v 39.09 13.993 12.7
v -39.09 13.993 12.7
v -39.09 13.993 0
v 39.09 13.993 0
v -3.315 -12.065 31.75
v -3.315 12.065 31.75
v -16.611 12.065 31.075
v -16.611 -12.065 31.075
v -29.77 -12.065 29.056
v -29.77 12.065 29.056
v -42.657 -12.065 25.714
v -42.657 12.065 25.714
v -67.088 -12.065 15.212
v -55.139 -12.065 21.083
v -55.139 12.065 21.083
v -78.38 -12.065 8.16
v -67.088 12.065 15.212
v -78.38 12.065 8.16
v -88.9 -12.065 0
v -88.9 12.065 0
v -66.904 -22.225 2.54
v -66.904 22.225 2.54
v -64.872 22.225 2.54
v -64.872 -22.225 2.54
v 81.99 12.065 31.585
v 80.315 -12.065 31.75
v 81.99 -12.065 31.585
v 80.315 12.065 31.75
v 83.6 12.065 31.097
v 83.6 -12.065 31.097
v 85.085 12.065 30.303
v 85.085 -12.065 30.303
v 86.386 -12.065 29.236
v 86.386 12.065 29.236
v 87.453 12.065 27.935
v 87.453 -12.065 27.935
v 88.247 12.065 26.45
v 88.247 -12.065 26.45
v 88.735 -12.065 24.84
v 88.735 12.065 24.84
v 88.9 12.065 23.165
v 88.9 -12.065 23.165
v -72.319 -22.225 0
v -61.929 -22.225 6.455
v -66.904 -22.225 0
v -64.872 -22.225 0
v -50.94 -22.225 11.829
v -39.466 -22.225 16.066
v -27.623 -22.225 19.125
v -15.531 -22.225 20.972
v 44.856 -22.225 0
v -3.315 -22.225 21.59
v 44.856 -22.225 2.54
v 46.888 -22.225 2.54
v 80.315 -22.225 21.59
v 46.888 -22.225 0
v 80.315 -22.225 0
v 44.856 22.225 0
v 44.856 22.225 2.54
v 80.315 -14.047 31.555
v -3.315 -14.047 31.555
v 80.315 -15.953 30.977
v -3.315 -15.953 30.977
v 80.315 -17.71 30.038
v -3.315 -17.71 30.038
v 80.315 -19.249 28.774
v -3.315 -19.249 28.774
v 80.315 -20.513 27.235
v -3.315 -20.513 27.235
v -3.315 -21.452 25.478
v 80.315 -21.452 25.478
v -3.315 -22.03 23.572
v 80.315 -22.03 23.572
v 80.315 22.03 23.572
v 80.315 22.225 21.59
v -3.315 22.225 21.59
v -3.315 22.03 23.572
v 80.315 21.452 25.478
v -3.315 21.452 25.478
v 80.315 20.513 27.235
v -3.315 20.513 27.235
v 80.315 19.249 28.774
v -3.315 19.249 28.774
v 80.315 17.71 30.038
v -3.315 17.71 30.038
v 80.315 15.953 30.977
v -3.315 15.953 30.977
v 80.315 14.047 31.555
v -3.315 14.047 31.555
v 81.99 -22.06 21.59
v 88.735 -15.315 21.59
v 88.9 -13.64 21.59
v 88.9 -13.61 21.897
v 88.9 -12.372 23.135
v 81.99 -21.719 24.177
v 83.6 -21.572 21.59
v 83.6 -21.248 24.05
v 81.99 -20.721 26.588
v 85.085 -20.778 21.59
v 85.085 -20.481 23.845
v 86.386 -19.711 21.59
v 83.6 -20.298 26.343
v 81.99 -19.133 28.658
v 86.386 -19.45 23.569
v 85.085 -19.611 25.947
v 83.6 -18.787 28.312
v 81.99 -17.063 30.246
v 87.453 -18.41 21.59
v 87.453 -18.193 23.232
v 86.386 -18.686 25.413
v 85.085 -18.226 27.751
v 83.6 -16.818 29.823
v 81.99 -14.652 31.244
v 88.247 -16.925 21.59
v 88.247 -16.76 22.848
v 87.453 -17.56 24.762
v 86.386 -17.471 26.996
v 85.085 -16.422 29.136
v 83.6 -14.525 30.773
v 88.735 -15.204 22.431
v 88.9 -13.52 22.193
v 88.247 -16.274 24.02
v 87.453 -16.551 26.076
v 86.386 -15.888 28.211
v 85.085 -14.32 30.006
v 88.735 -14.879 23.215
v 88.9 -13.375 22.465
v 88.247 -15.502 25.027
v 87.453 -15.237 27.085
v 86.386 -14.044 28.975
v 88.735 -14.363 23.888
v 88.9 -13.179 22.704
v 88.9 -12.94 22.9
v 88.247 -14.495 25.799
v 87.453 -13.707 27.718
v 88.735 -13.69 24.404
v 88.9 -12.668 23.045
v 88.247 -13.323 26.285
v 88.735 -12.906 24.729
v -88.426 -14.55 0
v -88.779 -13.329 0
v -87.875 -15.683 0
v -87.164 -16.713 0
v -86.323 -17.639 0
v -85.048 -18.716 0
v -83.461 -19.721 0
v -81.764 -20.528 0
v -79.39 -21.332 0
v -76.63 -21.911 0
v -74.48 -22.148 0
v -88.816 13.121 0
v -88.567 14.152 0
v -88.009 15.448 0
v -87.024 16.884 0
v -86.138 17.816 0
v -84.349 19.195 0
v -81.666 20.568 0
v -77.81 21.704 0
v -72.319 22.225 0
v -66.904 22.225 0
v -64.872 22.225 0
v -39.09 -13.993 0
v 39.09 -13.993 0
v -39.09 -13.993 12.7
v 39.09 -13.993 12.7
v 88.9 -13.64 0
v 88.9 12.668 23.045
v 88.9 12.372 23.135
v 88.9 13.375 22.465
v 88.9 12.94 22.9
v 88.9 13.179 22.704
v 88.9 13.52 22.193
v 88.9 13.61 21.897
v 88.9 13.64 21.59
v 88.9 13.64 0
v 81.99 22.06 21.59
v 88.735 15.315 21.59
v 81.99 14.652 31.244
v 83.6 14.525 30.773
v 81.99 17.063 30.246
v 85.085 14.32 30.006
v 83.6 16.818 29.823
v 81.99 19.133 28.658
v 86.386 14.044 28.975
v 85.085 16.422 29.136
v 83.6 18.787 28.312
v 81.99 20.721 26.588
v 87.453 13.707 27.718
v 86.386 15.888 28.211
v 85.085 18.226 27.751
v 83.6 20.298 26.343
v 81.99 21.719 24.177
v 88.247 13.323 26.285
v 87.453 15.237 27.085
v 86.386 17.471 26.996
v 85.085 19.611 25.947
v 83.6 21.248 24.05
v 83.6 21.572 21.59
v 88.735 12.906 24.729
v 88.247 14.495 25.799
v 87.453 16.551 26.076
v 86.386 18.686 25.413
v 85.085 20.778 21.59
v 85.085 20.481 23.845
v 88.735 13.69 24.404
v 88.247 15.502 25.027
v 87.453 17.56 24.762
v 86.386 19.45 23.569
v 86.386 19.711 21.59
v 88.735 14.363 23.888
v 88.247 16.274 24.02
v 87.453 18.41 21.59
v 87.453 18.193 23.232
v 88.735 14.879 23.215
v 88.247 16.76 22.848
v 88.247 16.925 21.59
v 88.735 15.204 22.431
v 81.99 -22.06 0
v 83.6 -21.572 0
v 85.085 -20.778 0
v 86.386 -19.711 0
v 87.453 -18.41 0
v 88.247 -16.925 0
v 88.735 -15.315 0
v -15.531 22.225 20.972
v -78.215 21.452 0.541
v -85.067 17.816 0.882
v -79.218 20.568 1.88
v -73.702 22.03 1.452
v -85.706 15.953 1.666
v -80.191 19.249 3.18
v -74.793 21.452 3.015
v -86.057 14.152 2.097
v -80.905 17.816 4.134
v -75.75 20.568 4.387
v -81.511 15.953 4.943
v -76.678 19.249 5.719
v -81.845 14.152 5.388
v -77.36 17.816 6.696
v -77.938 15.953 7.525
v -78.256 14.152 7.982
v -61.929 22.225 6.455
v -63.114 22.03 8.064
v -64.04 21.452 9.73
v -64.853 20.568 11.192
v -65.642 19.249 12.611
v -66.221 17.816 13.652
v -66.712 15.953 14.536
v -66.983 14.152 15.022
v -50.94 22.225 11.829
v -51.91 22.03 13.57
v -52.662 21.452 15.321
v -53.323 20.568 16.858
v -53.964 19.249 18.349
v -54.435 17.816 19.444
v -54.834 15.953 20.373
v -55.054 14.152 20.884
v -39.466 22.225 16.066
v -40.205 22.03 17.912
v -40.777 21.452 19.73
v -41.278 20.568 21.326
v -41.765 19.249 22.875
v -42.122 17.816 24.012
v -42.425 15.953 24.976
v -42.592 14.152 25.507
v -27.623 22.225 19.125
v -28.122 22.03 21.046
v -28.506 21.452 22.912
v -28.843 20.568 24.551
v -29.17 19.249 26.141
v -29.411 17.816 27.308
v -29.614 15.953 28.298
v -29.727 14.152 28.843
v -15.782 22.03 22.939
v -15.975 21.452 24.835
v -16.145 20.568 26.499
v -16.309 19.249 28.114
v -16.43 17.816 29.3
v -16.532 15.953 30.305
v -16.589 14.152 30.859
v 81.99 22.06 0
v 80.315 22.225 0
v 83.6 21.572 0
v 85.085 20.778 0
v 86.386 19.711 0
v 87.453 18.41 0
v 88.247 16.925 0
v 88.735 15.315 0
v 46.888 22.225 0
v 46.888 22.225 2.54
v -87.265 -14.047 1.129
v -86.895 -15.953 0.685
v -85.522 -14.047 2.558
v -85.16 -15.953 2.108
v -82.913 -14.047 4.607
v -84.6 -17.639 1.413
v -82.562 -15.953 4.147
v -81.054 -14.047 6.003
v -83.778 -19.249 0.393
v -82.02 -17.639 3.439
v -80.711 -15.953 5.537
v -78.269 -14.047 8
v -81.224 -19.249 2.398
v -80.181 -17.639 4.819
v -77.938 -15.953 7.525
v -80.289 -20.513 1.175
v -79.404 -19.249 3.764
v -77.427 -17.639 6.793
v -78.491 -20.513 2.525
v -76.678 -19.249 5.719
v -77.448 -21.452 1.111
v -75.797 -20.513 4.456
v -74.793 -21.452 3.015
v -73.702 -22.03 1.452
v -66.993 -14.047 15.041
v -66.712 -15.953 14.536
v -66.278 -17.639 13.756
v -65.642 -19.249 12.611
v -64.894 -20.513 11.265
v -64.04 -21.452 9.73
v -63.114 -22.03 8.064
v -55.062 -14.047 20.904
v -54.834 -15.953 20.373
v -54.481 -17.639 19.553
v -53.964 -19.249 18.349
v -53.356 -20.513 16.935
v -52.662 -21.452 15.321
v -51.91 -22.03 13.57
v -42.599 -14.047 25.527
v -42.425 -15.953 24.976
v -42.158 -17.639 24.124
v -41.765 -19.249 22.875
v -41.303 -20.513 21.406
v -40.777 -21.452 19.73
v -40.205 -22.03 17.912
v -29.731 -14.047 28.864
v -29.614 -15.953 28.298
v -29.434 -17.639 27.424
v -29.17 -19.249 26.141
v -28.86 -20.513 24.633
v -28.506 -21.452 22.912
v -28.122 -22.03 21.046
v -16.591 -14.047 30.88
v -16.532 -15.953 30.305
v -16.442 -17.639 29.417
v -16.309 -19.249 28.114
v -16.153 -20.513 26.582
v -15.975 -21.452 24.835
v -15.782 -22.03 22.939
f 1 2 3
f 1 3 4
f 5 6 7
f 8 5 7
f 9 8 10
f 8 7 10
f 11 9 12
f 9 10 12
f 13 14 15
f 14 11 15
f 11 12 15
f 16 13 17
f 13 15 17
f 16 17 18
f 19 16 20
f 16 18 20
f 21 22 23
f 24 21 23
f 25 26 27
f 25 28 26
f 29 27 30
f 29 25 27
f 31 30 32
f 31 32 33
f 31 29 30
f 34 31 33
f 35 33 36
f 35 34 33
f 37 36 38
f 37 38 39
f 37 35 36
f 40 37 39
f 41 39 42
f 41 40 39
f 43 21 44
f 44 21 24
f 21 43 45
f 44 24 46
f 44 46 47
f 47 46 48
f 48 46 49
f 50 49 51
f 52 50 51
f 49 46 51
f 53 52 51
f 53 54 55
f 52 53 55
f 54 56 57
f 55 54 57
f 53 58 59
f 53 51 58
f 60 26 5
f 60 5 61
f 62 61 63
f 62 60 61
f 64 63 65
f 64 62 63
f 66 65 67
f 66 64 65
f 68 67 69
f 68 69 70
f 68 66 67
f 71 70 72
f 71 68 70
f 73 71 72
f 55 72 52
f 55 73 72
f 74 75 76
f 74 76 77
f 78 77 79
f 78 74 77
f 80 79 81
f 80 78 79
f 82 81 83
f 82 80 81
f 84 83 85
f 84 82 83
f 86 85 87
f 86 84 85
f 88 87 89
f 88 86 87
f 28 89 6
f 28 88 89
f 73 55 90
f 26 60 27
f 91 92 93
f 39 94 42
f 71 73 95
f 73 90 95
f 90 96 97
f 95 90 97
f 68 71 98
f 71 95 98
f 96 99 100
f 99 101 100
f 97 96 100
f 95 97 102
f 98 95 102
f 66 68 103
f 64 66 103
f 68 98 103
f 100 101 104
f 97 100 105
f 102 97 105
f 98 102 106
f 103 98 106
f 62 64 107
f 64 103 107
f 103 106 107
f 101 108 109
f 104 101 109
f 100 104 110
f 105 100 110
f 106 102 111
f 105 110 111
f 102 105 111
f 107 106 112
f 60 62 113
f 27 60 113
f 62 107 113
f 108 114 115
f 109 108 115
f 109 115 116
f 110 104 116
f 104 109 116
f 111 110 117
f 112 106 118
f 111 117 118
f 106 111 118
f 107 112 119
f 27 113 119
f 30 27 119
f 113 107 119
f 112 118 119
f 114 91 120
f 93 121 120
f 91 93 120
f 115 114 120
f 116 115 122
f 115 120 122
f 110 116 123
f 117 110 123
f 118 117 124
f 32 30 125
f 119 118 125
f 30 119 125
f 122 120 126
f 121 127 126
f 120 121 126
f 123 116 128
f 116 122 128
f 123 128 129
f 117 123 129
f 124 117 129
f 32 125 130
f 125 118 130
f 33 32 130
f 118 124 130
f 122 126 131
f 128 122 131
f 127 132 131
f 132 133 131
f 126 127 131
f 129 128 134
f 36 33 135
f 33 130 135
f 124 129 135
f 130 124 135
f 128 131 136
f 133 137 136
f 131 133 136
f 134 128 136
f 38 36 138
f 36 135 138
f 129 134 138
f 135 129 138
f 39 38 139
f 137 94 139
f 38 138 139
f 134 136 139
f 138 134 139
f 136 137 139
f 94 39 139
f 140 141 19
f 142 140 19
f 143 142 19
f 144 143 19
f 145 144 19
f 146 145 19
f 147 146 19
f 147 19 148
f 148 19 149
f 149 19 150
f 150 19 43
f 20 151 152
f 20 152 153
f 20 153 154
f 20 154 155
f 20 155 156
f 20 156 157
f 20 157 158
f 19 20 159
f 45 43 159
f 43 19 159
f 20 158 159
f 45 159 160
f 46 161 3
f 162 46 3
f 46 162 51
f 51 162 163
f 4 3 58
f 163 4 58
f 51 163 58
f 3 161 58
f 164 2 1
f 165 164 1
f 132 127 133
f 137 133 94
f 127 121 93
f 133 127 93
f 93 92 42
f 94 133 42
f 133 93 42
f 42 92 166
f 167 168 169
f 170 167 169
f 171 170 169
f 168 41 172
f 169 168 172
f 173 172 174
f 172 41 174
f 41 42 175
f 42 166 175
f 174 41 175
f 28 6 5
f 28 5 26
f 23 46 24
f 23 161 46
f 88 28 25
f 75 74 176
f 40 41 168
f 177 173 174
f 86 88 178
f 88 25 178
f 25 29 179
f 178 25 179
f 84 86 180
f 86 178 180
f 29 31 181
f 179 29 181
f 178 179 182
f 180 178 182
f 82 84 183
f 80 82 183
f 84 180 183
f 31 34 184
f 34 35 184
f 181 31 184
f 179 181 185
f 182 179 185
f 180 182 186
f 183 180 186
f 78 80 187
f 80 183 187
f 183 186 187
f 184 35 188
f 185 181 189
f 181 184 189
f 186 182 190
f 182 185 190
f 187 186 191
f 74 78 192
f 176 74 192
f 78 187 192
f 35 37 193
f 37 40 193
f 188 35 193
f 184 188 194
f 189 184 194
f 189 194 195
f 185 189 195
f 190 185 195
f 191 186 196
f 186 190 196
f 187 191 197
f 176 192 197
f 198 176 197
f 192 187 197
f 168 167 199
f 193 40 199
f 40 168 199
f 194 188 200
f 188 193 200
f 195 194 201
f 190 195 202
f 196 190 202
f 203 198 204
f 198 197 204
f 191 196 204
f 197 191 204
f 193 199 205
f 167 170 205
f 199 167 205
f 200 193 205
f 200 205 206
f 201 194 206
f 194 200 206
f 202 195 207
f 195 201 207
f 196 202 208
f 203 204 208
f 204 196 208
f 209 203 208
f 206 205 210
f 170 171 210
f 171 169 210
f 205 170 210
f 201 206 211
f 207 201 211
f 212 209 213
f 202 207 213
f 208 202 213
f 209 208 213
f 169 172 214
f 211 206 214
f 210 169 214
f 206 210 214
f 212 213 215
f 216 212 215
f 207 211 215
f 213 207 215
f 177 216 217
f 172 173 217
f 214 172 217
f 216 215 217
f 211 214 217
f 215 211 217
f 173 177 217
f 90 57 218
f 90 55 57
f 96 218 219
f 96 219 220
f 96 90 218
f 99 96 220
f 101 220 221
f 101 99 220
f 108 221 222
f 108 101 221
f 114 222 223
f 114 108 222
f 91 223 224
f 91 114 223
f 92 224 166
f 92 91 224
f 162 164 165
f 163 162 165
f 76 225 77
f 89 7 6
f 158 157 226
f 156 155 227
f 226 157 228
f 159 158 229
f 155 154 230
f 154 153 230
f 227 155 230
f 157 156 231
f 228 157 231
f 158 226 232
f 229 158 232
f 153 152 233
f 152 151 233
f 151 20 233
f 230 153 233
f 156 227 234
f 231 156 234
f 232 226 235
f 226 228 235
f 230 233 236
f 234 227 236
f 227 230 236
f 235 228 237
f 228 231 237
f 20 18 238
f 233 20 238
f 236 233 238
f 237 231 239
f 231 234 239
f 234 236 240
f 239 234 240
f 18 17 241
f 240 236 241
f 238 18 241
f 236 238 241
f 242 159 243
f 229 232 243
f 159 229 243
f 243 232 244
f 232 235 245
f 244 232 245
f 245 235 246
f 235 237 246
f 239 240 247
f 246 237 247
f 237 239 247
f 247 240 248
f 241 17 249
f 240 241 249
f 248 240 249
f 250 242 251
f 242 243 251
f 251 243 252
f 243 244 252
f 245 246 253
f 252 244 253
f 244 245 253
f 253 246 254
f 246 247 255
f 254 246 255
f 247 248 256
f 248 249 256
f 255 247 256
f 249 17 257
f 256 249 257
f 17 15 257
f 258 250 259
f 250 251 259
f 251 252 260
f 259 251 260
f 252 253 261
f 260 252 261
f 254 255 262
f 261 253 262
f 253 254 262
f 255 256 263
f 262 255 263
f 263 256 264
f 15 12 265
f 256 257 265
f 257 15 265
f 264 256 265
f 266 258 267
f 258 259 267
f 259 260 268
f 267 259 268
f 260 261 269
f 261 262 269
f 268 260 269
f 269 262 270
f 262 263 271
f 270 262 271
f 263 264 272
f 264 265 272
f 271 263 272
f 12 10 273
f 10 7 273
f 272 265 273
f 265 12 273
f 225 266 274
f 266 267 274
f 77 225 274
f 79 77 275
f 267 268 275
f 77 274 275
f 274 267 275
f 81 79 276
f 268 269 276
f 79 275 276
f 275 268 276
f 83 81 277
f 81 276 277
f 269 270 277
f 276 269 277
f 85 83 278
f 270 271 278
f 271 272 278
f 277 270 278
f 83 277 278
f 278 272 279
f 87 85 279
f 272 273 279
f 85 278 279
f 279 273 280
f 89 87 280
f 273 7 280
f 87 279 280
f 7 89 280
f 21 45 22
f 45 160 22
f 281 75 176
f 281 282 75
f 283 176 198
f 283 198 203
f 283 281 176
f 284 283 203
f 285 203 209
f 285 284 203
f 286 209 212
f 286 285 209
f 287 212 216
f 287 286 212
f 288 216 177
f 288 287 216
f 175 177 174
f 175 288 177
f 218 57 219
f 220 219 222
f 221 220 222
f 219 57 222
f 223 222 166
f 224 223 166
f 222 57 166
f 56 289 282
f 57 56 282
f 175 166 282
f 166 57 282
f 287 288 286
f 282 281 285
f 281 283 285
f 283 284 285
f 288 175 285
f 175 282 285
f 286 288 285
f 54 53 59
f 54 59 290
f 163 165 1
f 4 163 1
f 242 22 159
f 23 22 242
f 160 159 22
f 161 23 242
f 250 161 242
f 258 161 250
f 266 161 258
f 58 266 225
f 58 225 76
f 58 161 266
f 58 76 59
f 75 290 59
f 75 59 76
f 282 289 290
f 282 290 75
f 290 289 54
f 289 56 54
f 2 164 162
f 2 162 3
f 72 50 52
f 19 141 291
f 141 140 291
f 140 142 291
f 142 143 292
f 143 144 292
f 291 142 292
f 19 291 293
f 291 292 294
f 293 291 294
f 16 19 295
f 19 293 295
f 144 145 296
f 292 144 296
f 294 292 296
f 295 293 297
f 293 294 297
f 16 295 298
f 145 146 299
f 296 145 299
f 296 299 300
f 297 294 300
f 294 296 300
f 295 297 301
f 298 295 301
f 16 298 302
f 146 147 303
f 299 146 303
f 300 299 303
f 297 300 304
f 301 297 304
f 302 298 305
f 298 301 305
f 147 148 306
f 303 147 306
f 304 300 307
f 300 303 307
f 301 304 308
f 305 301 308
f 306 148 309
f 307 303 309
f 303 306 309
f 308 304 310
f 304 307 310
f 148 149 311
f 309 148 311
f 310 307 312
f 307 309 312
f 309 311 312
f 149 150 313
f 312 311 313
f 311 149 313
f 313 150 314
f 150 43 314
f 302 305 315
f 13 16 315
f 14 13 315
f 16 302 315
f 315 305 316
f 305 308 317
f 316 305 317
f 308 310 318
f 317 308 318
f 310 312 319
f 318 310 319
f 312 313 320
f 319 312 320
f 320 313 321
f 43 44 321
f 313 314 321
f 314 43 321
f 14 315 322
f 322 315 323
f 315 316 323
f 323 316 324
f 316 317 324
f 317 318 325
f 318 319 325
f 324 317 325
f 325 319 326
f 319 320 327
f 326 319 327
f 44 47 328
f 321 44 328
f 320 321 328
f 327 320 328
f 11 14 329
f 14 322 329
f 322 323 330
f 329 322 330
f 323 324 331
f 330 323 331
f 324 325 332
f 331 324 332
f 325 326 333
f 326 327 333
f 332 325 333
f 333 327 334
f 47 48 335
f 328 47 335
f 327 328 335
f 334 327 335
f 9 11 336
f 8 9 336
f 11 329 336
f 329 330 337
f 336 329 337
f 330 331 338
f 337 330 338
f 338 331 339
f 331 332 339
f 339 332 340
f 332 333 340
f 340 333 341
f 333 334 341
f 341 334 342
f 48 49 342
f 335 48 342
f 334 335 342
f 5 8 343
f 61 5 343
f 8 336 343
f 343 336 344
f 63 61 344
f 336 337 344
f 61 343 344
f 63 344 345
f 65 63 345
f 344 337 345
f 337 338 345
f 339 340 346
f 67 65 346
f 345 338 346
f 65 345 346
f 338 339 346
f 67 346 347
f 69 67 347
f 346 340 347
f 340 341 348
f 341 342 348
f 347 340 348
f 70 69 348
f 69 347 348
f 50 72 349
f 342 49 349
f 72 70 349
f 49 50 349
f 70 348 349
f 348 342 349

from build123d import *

# Parameters (mm, degrees)
F0_W        = 177.8
F0_H        = 44.45
F1_DEPTH    = 31.75
F2_W        = 2.032
F2_H        = 5.08
F2_H_2      = 2.957622528
F3_DEPTH    = 70.866
F4_T1_DEPTH = 472.3767319638
F5_R        = 10.16
F6_R        = 10.16
F7_R        = 8.5849434278
F8_W        = 78.1799629331
F8_H        = 27.9869418591
F9_DEPTH    = 12.7


# Not quite as in the source:
# - a fillet or chamfer that OpenCascade refuses, or shapes differently, is made with other operations: its cross-section is extruded or revolved along the edge and cut away or added


with BuildPart() as f1:
    # F0 (on Top) → F1 (new body)
    with BuildSketch(Plane.XY):
        Rectangle(F0_W, F0_H)
    extrude(amount=F1_DEPTH)

    # F2 (on Front) → F3 (cut, symmetric)
    with BuildSketch(Plane.XZ):
        with Locations((-65.8876, 0)):
            Rectangle(F2_W, F2_H)
        with Locations((45.8724, 1.061188736)):
            Rectangle(F2_W, F2_H_2)
    extrude(amount=F3_DEPTH, both=True, mode=Mode.SUBTRACT)

    # F4: fillet of radius 131.2269923964 on 1 edges, made by hand

    # F4_s2 → F4_t1 (cut)
    with BuildSketch(Plane.XZ.offset(-236.1883659819)):
        with BuildLine():
            ThreePointArc((-3.3146536072, 31.75), (-48.9570517069, 23.5567226134), (-88.9, 0))
            Line((-88.9, 0), (-88.9, 31.75))
            Line((-88.9, 31.75), (-3.3146536072, 31.75))
        make_face()
    extrude(amount=F4_T1_DEPTH, mode=Mode.SUBTRACT)

    # F5
    f5_edges = [f1.edges().sort_by_distance(p)[0] for p in [
        (-48.957052, -22.225, 23.556723),
    ]]
    fillet(f5_edges, radius=F5_R)

    # F6
    f6_edges = [f1.edges().sort_by_distance(p)[0] for p in [
        (42.792673, 22.225, 31.75),
        (-48.957052, 22.225, 23.556723),
    ]]
    fillet(f6_edges, radius=F6_R)

    # F7
    f7_edges = [f1.edges().sort_by_distance(p)[0] for p in [
        (88.9, 0, 31.75),
        (88.9, 22.225, 10.795),
        (88.9, -22.225, 10.795),
        (88.9, 19.249205, 28.774205),
        (88.9, -19.249205, 28.774205),
    ]]
    fillet(f7_edges, radius=F7_R)

    # F8 (on Top) → F9 (cut, symmetric)
    with BuildSketch(Plane.XY):
        Rectangle(F8_W, F8_H)
    extrude(amount=F9_DEPTH, both=True, mode=Mode.SUBTRACT)


solid = f1.part
